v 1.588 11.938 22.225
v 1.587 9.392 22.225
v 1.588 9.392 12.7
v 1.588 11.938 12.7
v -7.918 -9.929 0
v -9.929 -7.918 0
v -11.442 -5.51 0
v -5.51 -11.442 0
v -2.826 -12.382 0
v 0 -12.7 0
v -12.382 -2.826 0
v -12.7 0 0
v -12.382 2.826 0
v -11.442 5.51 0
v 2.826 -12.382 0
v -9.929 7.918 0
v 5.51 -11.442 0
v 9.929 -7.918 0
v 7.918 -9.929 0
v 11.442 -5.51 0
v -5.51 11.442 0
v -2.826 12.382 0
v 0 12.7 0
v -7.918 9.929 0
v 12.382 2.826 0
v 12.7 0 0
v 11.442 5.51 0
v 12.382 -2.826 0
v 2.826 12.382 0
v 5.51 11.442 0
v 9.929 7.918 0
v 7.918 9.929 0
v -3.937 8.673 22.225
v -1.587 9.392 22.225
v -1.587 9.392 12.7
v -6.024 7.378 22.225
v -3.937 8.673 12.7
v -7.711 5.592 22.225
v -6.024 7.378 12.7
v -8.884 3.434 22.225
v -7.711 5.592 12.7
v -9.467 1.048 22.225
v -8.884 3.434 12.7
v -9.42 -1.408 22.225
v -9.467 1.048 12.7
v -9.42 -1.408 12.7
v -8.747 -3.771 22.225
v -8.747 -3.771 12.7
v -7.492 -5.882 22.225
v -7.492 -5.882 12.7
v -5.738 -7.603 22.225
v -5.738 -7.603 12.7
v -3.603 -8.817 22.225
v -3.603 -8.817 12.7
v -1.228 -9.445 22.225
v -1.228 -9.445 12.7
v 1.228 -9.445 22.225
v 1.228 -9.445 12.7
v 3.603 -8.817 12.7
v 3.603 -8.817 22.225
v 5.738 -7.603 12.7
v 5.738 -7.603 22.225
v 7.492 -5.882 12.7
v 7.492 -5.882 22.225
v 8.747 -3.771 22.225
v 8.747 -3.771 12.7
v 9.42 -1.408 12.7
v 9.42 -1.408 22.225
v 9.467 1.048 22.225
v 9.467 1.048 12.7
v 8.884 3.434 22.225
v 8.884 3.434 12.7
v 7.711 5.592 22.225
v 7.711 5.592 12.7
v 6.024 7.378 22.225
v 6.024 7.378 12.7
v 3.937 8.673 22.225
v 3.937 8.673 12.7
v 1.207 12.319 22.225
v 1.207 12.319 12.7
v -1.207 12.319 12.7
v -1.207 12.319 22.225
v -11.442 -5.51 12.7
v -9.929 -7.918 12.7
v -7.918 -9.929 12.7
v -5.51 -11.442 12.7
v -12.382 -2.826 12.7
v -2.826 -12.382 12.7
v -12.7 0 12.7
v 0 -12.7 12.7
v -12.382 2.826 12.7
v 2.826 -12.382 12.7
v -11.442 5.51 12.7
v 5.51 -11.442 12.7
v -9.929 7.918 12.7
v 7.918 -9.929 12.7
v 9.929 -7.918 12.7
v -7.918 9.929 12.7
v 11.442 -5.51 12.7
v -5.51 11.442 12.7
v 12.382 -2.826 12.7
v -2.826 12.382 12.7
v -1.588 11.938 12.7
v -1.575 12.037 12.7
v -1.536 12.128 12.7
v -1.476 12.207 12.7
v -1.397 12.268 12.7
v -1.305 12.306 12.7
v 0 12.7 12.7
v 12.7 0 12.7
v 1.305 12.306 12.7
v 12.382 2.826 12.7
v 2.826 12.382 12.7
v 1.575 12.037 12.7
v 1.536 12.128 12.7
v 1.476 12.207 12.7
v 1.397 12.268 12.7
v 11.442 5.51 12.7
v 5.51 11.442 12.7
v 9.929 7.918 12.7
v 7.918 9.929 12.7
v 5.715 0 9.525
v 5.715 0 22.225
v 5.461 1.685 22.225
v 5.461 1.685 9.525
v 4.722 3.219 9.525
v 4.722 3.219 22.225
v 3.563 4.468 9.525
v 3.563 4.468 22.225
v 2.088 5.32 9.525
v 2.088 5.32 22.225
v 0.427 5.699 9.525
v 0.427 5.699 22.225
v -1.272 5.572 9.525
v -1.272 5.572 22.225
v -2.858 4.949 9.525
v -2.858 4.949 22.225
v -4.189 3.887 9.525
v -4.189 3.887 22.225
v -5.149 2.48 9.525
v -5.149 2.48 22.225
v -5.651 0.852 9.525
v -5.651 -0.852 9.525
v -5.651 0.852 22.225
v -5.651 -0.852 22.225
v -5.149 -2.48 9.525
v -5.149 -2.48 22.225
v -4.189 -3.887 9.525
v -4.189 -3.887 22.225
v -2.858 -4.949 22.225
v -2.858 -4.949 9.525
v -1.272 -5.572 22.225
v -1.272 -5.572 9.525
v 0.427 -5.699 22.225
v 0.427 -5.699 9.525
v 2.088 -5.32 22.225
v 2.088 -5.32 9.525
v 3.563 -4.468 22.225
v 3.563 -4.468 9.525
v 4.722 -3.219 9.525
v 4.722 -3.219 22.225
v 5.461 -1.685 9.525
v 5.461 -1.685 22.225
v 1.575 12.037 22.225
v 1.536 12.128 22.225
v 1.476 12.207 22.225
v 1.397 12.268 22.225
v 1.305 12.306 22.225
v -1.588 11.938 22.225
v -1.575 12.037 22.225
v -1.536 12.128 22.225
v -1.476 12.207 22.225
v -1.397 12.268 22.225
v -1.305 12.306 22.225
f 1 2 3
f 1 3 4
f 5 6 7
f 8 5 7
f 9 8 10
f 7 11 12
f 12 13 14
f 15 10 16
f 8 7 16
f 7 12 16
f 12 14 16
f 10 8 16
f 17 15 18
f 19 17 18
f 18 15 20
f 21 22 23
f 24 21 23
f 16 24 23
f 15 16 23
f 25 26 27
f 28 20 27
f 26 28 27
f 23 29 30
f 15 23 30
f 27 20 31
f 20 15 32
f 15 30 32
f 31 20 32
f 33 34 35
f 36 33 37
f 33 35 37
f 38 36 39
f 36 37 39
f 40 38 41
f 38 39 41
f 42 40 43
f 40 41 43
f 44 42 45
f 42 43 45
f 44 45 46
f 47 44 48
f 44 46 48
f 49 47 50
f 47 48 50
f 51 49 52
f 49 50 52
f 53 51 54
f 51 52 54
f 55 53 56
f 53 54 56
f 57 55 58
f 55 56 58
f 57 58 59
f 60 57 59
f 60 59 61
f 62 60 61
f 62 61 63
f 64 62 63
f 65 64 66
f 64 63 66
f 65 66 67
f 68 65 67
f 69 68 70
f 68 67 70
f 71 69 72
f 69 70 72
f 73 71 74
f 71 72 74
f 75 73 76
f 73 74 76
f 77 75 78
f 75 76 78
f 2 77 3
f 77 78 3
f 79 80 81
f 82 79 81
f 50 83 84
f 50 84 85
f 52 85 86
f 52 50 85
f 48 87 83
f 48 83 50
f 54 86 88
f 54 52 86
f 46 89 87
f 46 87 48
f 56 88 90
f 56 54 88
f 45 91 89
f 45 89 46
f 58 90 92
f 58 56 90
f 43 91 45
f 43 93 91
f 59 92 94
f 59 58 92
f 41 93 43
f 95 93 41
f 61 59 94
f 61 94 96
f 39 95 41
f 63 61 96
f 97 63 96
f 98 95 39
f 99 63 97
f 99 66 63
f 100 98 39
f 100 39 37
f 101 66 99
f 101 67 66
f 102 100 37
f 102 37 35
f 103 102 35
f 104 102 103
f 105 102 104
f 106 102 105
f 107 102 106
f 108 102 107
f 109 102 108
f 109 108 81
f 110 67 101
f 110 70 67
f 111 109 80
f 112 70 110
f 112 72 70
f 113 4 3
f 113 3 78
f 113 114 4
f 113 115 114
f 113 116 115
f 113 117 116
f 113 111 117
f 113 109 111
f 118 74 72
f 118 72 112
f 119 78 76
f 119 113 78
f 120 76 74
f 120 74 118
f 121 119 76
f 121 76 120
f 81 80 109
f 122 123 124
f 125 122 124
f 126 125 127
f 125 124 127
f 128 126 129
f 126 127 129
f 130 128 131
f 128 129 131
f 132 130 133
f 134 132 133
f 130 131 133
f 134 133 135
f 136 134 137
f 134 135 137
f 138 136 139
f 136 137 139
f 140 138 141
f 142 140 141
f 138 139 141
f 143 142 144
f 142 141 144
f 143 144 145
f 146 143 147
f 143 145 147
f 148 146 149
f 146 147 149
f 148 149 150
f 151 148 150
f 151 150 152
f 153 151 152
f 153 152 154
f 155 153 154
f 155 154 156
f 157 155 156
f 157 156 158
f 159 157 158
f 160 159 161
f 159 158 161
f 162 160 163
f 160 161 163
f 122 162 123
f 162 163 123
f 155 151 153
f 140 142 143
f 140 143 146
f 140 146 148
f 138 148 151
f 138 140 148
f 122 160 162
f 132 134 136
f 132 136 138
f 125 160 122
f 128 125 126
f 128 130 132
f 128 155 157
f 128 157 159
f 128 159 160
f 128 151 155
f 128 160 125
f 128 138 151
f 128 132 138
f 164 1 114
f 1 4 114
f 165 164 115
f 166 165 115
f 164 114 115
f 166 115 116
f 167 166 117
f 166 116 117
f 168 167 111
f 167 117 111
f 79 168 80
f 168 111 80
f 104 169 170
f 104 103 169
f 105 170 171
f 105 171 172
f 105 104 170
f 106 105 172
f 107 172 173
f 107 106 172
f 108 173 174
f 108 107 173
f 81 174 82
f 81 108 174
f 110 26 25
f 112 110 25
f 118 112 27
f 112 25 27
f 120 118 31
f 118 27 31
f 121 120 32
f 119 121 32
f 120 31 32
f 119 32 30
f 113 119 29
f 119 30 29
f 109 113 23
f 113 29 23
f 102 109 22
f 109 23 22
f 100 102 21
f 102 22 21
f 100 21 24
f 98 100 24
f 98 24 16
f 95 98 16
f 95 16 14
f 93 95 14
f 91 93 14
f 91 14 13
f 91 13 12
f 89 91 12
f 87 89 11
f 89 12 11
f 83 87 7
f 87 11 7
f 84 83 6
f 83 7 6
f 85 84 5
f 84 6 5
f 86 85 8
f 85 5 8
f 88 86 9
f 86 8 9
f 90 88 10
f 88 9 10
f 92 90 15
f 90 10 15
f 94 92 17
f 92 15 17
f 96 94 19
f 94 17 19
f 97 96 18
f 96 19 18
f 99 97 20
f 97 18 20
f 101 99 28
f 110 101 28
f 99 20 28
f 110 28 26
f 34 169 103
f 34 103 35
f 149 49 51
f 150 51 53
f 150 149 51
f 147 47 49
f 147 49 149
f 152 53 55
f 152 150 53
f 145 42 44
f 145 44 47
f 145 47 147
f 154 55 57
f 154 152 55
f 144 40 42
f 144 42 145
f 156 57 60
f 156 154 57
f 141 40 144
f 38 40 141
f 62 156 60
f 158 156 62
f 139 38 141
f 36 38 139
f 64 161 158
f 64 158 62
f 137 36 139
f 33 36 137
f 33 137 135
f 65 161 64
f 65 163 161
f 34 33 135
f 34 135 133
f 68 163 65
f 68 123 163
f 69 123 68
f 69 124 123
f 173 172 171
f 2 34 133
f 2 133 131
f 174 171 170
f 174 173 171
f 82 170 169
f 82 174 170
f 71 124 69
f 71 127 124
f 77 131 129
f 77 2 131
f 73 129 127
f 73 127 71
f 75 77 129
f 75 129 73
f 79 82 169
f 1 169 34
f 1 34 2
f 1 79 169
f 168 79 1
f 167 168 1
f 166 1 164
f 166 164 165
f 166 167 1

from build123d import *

# Parameters (mm, degrees)
F0_R     = 12.7
F1_DEPTH = 12.7
F2_R     = 9.525
F3_DEPTH = 9.525
F5_DEPTH = 10.16
F6_R     = 5.715
F7_DEPTH = 12.7
F8_R     = 0.381


with BuildPart() as f1:
    # F0 (on Top) → F1 (new body)
    with BuildSketch(Plane.XY):
        Circle(F0_R)
    extrude(amount=F1_DEPTH)

    # F2 (on face) → F3 (join)
    with BuildSketch(Plane.XY.offset(12.7)):
        Circle(F2_R)
    extrude(amount=F3_DEPTH)

    # F4 (on face) → F5 (join)
    with BuildSketch(Plane.XY.offset(22.225)):
        with BuildLine():
            Line((-1.5875, 9.391777), (-1.5875, 6.731))
            Line((-1.5875, 6.731), (1.5875, 6.731))
            Line((1.5875, 6.731), (1.5875, 9.391777))
            ThreePointArc((1.5875, 9.391777), (0, 9.525), (-1.5875, 9.391777))
        make_face()
        with BuildLine():
            Line((-1.5875, 12.319), (-1.5875, 9.391777))
            ThreePointArc((-1.5875, 9.391777), (0, 9.525), (1.5875, 9.391777))
            Line((1.5875, 9.391777), (1.5875, 12.319))
            Line((1.5875, 12.319), (-1.5875, 12.319))
        make_face()
    extrude(amount=-F5_DEPTH)

    # F6 (on face) → F7 (cut)
    with BuildSketch(Plane.XY.offset(22.225)):
        Circle(F6_R)
    extrude(amount=-F7_DEPTH, mode=Mode.SUBTRACT)

    # F8
    f8_edges = [f1.edges().sort_by_distance(p)[0] for p in [
        (1.5875, 12.319, 17.4625),
        (-1.5875, 12.319, 17.4625),
    ]]
    fillet(f8_edges, radius=F8_R)


solid = f1.part
